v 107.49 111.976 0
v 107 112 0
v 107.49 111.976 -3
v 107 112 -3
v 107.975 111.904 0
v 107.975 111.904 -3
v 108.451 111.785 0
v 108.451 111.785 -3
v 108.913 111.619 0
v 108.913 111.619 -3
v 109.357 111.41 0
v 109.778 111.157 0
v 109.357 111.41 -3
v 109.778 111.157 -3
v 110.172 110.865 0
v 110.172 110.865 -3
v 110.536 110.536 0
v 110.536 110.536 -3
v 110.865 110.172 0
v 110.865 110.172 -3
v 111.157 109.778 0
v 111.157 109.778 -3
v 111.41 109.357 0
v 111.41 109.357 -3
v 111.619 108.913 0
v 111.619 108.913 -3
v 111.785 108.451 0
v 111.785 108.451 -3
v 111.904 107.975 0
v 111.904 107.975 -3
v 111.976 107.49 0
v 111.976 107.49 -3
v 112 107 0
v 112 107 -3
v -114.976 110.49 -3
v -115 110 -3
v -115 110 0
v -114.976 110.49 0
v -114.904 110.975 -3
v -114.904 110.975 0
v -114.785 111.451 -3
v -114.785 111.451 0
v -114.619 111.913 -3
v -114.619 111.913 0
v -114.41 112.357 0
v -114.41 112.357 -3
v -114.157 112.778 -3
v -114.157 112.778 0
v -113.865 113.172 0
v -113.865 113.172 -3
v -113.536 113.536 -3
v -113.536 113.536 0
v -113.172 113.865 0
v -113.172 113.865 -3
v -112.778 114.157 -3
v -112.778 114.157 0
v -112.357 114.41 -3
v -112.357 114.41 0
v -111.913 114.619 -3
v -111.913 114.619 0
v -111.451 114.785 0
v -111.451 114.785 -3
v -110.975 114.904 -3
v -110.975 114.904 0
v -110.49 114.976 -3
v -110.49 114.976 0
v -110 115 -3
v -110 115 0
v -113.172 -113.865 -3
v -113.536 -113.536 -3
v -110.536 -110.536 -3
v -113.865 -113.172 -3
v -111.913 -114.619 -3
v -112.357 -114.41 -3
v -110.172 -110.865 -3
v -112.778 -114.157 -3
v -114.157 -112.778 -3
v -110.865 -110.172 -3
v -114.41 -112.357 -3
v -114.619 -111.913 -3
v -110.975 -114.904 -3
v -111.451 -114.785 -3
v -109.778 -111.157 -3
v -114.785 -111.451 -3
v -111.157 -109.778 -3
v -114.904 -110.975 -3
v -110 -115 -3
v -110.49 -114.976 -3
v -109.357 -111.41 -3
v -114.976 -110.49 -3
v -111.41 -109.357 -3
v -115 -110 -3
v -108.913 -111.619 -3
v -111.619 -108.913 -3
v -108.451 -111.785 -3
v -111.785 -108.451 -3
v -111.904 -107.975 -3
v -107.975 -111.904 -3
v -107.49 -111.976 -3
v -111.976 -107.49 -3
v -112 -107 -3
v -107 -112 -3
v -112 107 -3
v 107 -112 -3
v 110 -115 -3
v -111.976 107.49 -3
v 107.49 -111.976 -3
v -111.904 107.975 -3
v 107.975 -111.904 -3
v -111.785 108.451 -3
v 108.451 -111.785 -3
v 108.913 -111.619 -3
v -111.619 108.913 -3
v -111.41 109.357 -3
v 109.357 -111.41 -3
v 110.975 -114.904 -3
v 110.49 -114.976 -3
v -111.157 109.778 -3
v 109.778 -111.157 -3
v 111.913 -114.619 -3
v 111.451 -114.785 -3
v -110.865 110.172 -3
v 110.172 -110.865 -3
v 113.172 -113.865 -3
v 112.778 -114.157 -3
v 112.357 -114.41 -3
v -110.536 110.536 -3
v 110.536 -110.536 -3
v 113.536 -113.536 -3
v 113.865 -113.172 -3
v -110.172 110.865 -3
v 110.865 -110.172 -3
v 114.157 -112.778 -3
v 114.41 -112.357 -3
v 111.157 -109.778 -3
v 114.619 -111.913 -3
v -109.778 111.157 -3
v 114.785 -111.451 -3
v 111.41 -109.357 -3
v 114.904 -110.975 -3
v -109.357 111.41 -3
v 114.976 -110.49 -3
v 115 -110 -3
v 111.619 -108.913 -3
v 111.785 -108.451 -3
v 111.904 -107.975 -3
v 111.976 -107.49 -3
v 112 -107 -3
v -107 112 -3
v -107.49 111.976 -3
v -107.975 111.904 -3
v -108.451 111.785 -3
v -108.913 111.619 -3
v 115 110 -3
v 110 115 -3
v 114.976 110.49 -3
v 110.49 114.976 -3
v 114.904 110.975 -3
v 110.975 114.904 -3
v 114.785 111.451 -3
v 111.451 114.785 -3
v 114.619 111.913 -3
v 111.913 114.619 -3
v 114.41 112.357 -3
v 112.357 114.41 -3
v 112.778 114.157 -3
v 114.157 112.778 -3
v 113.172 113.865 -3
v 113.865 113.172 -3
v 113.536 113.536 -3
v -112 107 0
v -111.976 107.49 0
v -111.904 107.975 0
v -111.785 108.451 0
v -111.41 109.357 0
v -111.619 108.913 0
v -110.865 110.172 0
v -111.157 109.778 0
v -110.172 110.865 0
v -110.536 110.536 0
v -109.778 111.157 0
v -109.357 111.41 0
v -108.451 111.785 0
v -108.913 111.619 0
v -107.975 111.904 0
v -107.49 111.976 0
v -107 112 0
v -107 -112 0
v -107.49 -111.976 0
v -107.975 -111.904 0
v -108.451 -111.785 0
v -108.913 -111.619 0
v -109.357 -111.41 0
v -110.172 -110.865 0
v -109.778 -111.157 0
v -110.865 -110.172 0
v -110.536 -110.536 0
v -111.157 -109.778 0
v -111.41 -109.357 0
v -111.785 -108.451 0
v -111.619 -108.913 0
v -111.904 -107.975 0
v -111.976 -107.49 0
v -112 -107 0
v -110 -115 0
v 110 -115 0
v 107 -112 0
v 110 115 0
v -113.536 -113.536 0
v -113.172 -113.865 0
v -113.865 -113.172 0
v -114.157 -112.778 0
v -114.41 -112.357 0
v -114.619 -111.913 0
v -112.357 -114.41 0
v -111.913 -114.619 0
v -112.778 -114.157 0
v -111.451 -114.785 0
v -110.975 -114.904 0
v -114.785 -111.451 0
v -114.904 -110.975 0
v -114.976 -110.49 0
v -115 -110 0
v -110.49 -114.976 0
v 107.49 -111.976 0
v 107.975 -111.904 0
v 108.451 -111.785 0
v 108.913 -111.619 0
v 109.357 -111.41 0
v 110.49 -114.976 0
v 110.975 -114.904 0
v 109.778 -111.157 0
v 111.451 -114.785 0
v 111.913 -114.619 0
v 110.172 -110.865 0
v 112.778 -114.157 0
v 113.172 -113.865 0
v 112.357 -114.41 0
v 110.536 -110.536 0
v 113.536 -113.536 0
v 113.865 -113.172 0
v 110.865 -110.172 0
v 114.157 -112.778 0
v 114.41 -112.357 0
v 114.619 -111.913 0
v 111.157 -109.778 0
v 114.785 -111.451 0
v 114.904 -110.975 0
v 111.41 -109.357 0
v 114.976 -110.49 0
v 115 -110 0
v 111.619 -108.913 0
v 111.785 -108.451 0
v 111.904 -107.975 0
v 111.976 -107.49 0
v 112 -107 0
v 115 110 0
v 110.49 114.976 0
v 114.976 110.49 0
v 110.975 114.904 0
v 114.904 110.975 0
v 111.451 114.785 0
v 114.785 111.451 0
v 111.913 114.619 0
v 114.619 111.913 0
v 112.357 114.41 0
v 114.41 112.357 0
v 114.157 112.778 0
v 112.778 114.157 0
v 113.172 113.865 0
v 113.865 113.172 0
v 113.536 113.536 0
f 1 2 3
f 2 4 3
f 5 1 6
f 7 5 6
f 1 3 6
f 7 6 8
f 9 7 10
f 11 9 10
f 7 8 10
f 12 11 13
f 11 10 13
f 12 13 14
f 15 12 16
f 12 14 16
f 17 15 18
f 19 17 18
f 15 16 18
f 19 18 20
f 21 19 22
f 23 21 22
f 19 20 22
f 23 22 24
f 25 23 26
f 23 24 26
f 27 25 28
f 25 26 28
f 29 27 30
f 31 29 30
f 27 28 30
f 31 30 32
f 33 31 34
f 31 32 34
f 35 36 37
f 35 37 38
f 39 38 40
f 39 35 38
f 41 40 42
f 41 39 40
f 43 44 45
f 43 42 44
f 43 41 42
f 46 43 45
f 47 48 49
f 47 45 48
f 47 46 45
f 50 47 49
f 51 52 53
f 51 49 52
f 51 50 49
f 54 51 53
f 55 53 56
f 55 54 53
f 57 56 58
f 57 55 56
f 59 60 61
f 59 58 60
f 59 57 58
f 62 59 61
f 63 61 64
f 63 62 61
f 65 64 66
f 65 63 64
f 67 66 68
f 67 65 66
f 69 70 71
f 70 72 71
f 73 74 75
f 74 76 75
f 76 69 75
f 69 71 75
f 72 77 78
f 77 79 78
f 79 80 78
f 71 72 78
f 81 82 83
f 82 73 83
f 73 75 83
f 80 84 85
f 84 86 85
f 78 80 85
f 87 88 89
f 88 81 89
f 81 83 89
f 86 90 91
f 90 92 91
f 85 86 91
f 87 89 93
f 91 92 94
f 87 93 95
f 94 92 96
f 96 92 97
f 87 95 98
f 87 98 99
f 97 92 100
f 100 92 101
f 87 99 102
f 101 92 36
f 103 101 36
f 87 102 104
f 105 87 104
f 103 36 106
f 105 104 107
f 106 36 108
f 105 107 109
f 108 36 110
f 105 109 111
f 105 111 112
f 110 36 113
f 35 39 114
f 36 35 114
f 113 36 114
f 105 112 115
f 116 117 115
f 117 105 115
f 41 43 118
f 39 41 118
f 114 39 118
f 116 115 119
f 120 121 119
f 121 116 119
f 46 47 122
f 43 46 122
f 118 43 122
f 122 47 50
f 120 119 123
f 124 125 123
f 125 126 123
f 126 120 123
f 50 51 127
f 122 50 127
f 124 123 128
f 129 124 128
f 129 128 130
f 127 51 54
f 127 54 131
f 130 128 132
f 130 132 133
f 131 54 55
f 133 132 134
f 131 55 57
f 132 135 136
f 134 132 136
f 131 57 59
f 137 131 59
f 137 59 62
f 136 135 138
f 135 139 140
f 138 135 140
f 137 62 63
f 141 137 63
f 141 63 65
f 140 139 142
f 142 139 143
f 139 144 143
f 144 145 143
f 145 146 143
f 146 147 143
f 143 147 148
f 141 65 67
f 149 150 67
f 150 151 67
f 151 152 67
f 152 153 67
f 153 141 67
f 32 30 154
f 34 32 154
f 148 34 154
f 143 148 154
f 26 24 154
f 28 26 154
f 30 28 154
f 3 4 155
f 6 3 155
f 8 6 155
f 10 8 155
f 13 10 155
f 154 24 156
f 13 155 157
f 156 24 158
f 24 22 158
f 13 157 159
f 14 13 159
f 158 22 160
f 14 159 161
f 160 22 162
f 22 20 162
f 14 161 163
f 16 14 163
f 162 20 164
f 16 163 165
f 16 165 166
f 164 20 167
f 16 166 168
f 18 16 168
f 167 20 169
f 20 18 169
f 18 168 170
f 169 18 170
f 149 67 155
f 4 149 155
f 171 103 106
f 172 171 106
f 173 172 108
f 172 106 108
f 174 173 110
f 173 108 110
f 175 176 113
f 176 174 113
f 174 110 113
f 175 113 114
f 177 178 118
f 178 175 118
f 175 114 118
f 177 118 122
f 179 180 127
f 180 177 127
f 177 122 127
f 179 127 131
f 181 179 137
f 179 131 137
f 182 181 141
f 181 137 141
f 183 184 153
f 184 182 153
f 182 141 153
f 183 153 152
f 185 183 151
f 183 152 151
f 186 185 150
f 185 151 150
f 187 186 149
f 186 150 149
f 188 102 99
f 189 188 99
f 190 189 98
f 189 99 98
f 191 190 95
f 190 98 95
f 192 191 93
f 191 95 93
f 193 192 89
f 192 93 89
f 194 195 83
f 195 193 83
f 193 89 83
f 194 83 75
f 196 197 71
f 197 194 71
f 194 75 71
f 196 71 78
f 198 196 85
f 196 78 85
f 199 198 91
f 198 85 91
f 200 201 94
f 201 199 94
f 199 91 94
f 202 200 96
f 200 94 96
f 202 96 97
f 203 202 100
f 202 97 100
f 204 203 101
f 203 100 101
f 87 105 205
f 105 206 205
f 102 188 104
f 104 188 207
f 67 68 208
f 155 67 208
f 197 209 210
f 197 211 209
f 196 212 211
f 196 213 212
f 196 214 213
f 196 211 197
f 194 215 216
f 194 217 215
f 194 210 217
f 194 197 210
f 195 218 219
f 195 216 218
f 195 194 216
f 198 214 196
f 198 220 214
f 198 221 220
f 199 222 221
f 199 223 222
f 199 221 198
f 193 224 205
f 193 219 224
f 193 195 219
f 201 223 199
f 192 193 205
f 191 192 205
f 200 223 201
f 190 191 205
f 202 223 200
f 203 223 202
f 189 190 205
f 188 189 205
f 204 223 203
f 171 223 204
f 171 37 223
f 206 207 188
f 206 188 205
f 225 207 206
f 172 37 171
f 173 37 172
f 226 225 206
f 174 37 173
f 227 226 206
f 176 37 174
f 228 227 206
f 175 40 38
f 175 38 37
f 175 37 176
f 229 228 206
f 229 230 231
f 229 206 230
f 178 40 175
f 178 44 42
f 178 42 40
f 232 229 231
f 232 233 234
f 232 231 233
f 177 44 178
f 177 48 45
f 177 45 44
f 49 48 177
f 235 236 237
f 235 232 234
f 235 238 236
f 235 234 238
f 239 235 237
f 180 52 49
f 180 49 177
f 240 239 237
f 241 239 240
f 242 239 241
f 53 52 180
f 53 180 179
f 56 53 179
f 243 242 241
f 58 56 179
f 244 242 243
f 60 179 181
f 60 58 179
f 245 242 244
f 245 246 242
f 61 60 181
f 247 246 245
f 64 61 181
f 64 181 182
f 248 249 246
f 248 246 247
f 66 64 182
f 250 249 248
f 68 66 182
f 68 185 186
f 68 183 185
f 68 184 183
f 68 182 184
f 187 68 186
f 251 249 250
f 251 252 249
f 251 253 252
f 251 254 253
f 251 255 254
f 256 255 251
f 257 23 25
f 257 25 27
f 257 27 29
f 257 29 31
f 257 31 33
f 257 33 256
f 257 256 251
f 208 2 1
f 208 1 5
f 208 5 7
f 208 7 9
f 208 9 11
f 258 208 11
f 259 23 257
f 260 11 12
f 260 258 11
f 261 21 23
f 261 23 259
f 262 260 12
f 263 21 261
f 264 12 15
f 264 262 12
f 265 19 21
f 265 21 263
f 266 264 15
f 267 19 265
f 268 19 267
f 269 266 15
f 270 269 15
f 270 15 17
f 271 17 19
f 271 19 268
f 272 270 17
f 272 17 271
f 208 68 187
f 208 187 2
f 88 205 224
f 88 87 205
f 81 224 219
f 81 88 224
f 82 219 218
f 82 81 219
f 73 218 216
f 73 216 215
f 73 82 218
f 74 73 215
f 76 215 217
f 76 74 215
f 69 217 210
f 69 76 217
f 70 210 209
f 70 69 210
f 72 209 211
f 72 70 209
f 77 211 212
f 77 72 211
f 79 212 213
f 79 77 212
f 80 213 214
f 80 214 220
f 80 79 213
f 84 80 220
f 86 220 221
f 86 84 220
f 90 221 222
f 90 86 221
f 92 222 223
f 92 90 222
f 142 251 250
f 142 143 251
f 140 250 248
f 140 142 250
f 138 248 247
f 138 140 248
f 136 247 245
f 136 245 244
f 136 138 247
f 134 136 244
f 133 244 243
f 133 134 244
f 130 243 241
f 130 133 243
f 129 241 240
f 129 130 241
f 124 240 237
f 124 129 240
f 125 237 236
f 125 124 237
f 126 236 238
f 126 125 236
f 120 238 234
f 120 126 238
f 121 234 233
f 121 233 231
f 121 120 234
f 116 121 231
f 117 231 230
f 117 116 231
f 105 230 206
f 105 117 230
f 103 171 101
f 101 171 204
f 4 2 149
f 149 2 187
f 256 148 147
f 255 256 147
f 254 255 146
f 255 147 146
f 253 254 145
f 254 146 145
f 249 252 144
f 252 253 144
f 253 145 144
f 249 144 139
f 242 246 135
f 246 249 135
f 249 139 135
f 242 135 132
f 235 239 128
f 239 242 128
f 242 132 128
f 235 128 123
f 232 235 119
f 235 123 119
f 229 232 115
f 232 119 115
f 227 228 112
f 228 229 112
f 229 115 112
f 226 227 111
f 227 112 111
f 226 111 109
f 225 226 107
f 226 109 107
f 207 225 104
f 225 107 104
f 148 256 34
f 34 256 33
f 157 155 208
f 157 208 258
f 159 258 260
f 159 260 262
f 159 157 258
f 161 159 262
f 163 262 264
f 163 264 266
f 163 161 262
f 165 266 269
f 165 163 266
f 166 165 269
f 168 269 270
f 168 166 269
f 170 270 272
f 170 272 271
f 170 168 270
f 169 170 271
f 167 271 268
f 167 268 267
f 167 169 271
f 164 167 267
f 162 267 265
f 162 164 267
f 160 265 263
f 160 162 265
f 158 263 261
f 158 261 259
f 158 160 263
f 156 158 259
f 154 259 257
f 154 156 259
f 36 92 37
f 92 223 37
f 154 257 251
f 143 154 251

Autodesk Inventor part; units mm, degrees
ref_plane "YZ Plane" through (0, 0, 0) normal (1, 0, 0) x (0, 1, 0)
ref_plane "XZ Plane" through (0, 0, 0) normal (0, 1, 0) x (-1, 0, 0)
ref_plane "XY Plane" through (0, 0, 0) normal (0, 0, 1) x (1, 0, 0)
sketch "Sketch1" plane through (0, 0, 0) normal (0, 0, 1) x (1, 0, 0)
  line L0 (-115, 115) -> (115, 115)
  line L1 (115, 115) -> (115, -115)
  line L2 (115, -115) -> (-115, -115)
  line L3 (-115, -115) -> (-115, 115)
  line L4 (112, 112) -> (-112, 112)
  line L5 (-112, 112) -> (-112, -112)
  line L6 (-112, -112) -> (112, -112)
  line L7 (112, -112) -> (112, 112)
  point P0 (0, 0)
  dimension "d0" = 230
  dimension "d1" = 230
  dimension "d2" = 115
  dimension "d3" = 115
  dimension "d4" = 3
extrude "Extrusion1" add sketch "Sketch1" against normal blind 3
fillet "Fillet1" radius 5 8 edges at (-115, 115, -1.5) (-112, 112, -1.5) (-112, -112, -1.5) (-115, -115, -1.5) (115, -115, -1.5) (112, -112, -1.5) (115, 115, -1.5) (112, 112, -1.5)
equation "\"d1\" = d0"
equation "\"d2\" = 0.5 * d0"
equation "\"d3\" = 0.5 * d0"
properties part number "border"
